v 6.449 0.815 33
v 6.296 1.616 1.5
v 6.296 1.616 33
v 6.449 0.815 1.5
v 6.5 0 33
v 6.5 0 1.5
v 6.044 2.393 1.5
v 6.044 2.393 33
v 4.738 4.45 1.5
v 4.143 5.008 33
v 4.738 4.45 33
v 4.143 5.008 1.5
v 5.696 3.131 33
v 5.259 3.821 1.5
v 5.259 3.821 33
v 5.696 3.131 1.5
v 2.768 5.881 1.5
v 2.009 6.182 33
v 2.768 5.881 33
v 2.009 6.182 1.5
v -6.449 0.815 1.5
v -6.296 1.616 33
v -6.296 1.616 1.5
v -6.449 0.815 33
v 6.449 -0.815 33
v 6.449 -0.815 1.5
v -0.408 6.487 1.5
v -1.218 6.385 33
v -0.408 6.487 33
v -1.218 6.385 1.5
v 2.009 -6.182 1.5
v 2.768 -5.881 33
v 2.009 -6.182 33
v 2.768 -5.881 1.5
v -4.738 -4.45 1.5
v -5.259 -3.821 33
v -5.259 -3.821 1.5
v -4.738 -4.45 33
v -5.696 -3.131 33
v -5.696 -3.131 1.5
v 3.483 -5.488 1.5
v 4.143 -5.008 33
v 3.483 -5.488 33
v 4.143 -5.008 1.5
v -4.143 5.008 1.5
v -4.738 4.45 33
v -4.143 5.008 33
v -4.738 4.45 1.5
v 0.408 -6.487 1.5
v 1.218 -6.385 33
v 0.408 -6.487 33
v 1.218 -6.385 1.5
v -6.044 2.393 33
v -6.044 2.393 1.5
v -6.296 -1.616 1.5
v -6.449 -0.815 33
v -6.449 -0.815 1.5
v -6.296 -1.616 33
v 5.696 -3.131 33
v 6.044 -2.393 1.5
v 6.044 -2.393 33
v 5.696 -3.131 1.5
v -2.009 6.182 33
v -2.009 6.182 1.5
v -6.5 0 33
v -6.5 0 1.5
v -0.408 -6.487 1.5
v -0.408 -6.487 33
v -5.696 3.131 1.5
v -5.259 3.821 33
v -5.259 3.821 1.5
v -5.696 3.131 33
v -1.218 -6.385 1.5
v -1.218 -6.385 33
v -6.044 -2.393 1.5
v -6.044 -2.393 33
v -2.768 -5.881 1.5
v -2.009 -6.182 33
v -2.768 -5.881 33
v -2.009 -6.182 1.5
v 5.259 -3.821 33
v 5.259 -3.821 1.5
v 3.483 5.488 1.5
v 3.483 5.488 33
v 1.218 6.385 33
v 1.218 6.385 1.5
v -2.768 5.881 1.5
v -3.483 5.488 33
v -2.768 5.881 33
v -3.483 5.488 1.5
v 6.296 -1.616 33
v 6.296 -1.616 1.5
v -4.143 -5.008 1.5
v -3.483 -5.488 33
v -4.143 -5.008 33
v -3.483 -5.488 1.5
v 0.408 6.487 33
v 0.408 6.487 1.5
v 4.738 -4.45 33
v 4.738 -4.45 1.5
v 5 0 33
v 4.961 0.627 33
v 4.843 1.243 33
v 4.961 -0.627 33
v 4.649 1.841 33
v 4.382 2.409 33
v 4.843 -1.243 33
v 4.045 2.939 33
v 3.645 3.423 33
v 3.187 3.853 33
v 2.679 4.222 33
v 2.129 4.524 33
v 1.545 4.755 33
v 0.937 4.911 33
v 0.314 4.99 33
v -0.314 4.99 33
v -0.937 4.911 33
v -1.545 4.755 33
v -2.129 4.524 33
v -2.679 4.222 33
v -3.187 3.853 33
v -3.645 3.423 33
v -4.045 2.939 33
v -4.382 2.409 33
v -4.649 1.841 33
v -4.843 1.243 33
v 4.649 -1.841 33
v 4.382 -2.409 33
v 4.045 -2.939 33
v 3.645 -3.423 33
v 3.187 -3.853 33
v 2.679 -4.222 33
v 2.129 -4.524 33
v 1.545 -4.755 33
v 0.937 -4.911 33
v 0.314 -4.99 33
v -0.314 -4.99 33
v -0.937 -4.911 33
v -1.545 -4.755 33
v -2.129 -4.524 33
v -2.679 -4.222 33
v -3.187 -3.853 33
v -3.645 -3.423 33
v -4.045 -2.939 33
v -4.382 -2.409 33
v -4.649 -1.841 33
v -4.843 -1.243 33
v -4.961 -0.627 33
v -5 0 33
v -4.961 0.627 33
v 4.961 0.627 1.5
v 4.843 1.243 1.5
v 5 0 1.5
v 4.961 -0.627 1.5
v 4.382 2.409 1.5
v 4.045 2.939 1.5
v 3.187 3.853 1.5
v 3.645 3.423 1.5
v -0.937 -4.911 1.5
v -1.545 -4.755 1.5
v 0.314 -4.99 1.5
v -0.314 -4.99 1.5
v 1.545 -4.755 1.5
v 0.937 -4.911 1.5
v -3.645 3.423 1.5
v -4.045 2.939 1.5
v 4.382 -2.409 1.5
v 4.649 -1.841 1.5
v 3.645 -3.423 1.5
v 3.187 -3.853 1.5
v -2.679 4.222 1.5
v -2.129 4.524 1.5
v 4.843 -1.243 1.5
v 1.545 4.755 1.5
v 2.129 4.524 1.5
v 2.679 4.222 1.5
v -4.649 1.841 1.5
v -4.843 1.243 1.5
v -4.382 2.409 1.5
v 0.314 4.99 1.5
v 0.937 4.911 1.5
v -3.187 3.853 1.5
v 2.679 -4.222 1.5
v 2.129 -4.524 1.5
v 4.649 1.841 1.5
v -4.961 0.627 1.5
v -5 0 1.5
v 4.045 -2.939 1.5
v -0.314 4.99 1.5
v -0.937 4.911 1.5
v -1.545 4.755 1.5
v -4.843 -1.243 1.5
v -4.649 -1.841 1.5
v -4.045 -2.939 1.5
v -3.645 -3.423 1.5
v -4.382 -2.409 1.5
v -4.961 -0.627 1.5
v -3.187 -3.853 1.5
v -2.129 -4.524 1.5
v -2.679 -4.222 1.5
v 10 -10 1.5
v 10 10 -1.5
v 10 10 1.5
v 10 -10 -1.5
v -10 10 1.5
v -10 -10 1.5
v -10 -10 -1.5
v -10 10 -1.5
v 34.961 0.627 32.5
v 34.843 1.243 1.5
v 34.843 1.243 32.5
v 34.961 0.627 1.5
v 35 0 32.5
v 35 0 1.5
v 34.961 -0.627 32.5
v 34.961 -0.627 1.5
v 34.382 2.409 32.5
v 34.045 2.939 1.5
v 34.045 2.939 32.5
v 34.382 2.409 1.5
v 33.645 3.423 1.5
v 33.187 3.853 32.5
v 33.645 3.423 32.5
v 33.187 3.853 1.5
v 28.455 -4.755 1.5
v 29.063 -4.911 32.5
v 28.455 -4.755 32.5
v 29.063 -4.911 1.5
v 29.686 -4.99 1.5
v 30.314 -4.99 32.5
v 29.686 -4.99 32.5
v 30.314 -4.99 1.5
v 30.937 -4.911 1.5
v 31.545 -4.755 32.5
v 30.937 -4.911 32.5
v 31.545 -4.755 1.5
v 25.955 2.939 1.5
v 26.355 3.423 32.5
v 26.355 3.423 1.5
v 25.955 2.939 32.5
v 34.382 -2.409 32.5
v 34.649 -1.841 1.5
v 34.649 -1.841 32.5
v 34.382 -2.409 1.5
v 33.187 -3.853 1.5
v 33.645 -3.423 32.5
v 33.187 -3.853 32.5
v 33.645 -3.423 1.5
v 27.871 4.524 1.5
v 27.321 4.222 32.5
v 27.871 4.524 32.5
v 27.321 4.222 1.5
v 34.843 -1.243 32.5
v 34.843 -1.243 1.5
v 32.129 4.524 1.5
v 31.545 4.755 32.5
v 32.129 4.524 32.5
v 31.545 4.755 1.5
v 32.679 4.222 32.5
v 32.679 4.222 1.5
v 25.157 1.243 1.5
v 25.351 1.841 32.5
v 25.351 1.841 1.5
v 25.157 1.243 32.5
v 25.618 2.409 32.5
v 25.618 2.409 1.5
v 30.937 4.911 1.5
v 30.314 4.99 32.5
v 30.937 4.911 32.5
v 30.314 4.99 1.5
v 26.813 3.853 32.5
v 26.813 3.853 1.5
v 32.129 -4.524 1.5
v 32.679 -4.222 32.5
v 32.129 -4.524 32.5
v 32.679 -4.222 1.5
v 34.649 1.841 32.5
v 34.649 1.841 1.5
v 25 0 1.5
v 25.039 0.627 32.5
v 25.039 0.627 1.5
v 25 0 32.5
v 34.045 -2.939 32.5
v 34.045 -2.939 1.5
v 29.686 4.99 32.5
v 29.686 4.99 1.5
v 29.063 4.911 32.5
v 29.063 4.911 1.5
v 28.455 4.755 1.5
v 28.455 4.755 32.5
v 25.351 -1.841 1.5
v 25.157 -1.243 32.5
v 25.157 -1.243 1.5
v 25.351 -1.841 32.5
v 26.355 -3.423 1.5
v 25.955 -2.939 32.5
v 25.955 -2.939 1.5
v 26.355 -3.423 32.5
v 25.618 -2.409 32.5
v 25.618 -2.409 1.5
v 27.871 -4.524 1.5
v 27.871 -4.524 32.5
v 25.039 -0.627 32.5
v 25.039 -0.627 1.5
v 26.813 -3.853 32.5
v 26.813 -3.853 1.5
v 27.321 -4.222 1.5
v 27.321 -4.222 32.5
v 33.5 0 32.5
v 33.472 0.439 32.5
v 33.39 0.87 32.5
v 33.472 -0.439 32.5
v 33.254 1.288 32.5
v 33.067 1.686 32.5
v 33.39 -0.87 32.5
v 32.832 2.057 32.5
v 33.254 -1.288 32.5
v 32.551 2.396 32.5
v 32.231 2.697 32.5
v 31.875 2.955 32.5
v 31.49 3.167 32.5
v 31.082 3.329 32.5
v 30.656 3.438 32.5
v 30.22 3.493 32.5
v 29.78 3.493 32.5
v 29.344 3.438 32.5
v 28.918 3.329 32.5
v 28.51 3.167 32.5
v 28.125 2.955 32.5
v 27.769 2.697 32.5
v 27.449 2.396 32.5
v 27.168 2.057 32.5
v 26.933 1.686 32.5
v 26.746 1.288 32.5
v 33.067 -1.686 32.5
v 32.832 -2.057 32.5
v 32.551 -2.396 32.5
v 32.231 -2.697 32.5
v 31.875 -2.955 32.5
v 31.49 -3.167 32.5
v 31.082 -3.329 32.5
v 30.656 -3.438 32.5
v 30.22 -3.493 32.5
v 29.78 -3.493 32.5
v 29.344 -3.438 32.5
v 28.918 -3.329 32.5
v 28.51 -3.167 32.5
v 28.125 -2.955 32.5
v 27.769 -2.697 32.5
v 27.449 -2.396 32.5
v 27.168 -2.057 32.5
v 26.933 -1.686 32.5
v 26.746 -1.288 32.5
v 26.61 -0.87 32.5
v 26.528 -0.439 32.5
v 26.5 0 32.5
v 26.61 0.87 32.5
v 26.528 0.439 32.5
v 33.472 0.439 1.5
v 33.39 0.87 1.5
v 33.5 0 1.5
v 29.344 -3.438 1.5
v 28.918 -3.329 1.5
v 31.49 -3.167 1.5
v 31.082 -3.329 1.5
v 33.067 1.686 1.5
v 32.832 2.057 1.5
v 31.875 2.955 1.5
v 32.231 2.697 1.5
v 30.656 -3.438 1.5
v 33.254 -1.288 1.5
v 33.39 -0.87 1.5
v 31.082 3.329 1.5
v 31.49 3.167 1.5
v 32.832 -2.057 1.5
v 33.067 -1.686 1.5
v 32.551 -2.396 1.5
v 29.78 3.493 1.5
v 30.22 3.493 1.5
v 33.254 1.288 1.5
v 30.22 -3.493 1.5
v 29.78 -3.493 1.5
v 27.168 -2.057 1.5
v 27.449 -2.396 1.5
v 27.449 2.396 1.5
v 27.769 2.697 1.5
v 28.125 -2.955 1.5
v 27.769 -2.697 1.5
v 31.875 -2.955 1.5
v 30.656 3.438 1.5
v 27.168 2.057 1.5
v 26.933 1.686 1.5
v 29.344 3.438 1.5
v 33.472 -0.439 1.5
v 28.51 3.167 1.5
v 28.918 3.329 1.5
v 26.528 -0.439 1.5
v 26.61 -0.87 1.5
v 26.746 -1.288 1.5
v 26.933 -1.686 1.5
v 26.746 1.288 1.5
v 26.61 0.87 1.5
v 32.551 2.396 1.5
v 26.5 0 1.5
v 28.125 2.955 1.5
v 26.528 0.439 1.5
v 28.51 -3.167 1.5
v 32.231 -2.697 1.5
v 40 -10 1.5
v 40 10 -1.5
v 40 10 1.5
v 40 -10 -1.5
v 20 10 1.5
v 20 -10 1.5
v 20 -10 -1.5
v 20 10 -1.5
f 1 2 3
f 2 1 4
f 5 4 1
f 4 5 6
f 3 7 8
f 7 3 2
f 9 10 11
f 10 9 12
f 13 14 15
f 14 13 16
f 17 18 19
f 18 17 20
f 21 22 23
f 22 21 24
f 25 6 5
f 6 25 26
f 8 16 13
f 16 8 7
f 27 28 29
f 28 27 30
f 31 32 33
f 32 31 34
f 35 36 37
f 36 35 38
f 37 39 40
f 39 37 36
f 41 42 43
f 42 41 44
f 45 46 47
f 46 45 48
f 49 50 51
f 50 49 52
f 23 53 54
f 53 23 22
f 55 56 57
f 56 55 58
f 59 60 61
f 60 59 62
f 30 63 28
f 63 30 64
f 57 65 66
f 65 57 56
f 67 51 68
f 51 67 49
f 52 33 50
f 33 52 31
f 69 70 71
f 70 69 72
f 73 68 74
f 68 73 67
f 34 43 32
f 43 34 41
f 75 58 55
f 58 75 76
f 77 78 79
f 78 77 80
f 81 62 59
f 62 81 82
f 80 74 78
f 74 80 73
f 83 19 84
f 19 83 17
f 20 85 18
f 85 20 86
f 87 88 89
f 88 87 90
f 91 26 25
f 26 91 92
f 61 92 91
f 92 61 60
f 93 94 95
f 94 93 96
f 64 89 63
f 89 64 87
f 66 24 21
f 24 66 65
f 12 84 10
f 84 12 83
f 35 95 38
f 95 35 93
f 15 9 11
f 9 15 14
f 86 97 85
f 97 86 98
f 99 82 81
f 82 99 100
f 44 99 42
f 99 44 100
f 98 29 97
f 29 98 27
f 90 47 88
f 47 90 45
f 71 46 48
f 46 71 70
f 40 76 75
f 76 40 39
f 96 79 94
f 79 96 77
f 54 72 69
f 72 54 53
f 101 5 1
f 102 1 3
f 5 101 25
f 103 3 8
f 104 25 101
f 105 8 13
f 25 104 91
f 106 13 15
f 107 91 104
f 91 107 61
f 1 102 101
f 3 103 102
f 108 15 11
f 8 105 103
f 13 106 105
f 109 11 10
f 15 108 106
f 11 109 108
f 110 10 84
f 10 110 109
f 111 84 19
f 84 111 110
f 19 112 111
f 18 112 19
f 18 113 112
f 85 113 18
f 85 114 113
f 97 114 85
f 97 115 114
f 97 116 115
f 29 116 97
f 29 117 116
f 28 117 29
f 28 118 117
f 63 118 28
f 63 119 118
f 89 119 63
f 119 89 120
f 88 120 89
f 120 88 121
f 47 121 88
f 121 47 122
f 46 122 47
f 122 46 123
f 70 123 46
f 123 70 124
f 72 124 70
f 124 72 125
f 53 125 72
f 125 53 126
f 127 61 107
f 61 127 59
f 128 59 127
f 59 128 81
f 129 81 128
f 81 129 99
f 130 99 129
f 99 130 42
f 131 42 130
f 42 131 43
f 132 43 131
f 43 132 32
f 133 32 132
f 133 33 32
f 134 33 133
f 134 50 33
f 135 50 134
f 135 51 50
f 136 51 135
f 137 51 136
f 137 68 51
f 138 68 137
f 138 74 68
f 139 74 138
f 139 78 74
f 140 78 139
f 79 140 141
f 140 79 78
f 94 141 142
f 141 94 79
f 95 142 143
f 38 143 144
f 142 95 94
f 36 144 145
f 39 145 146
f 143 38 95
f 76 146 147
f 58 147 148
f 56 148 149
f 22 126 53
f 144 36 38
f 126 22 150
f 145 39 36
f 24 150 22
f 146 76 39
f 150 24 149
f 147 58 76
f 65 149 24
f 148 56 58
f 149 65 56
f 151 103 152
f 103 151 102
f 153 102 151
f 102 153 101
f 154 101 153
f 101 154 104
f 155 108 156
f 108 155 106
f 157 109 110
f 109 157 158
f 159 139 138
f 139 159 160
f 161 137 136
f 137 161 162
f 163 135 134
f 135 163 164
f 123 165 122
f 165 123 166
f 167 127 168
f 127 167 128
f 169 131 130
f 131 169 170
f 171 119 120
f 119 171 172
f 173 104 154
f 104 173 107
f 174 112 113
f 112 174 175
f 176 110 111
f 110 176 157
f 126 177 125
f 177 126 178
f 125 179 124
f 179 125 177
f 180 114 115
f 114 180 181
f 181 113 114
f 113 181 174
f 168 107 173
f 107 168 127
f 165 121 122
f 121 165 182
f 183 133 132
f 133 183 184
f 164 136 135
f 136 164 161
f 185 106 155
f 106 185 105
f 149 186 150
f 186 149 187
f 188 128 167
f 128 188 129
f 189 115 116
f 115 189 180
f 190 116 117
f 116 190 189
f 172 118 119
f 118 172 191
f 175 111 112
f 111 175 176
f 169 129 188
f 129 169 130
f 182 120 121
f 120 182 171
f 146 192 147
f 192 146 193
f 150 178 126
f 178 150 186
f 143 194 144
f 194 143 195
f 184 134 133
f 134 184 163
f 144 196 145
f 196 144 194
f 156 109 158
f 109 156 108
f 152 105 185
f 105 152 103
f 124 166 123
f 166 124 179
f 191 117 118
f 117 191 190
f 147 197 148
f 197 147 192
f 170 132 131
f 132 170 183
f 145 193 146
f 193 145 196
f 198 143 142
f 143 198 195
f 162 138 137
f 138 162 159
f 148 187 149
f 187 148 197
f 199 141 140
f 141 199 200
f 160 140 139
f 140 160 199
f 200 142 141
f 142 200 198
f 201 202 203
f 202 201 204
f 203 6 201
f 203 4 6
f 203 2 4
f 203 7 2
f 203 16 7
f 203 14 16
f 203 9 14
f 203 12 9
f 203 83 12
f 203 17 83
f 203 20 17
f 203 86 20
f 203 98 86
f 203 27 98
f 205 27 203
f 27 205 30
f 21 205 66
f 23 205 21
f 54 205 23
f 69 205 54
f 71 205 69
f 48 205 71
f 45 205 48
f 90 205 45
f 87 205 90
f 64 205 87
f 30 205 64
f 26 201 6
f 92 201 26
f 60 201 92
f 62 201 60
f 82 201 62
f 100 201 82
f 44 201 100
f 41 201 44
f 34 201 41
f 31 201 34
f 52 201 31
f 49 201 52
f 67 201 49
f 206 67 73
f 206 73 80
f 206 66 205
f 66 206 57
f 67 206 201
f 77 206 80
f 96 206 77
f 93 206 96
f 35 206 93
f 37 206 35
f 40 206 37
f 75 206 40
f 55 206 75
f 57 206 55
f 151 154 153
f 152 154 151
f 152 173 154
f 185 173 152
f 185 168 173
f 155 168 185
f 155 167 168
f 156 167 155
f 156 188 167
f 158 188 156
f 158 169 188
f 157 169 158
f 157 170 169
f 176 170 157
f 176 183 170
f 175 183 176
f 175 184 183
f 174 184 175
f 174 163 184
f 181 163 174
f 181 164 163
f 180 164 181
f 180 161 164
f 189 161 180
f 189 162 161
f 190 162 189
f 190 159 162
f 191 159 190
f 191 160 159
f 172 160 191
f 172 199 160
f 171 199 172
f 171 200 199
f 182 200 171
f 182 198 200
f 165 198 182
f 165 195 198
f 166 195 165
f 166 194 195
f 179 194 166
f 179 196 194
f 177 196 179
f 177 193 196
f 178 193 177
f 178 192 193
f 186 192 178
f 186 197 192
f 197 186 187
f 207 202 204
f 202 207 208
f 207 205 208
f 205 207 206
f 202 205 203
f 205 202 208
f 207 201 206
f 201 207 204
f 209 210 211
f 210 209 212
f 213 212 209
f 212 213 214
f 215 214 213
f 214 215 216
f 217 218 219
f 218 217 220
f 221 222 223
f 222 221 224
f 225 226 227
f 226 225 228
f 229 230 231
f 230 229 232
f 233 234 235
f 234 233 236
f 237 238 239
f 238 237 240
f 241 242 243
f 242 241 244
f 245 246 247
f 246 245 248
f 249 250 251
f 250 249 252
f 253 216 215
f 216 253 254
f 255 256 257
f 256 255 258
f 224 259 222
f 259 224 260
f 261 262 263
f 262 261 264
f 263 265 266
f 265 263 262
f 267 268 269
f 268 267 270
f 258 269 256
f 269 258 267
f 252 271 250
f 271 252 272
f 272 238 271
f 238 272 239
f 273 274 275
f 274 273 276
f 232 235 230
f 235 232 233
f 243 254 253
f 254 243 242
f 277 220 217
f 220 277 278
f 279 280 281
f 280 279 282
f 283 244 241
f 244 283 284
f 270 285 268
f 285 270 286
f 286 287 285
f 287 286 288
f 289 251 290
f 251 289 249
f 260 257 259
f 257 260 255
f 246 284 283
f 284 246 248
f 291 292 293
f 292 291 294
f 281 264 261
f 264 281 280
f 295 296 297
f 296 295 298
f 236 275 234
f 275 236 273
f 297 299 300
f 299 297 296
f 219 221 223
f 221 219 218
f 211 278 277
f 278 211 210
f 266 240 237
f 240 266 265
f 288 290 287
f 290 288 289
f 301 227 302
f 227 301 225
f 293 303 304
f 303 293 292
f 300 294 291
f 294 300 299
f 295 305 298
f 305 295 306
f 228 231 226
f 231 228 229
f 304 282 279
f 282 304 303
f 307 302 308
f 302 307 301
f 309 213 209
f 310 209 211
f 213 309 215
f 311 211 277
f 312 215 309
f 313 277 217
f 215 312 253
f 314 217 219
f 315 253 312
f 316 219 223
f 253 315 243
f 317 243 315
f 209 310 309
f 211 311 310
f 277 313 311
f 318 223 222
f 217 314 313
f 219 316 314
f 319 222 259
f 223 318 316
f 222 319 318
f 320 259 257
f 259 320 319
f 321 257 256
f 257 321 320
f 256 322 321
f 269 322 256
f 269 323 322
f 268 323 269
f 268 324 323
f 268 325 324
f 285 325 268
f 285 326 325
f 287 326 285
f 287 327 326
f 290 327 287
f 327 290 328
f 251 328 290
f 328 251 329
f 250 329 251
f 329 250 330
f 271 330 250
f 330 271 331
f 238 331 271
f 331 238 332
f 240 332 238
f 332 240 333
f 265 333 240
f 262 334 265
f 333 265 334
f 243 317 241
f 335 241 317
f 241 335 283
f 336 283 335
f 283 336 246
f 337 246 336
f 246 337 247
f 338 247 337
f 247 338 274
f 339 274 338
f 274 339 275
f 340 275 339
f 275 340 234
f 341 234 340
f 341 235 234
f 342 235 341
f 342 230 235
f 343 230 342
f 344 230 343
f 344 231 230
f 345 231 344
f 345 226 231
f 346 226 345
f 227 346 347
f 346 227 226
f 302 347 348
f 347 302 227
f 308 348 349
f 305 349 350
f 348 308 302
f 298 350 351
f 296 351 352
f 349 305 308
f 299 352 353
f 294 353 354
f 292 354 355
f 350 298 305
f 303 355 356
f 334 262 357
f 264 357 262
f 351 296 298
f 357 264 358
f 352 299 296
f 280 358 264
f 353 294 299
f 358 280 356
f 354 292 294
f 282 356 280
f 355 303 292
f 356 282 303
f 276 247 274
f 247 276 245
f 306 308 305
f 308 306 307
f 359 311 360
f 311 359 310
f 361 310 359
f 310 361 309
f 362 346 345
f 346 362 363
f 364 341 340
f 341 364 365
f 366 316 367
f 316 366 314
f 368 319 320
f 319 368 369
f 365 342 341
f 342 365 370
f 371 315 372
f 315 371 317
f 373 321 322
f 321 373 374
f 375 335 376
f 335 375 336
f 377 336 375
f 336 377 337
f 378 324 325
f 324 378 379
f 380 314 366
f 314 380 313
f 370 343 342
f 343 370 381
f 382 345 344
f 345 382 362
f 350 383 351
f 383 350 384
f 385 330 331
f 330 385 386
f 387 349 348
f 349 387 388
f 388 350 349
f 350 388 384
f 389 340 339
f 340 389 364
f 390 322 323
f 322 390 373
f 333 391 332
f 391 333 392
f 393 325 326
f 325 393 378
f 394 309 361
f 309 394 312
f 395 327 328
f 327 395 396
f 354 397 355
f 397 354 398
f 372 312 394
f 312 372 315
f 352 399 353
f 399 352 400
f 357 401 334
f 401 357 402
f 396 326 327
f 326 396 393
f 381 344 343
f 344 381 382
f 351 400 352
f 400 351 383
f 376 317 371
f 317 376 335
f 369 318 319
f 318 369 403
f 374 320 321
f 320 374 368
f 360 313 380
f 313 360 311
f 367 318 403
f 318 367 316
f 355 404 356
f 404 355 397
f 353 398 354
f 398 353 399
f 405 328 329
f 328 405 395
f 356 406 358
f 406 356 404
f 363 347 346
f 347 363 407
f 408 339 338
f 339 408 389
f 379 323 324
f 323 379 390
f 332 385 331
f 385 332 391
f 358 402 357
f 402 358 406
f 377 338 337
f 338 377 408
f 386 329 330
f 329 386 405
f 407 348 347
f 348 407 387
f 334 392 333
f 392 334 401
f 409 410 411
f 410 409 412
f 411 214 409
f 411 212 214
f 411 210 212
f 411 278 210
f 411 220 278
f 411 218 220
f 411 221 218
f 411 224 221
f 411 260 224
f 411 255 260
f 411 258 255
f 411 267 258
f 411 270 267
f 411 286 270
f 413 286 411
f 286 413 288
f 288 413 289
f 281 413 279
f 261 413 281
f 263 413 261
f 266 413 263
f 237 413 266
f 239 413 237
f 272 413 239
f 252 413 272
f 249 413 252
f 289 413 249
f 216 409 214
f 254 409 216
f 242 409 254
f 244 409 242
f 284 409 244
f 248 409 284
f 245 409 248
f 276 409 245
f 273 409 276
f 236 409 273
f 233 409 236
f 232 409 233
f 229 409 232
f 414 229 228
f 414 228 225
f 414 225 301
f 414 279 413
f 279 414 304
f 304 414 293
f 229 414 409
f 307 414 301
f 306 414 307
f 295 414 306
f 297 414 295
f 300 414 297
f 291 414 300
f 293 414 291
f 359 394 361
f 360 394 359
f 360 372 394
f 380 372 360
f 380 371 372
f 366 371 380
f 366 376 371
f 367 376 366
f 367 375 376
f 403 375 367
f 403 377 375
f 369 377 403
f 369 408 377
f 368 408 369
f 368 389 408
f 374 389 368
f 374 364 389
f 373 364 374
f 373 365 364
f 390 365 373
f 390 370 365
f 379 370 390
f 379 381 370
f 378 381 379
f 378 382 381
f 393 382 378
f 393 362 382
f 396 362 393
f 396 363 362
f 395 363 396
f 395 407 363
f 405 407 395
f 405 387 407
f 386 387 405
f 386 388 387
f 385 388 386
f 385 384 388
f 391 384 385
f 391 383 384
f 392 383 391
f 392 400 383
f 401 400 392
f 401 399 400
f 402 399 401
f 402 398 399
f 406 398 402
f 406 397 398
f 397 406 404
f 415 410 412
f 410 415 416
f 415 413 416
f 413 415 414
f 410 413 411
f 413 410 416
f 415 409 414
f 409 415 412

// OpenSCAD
/** *** ***** ******* ***********
//
// Generic Ring Object Storage/Dispenser - Ringhalter
// 
// Version 2 - 11.09.2017 : Customizer
// CC-BY-NC-SA October 2017 by ohuf@Thingiverse
//
// www.thingiverse.com/thing:2741363


(English text: scroll down...)

Ein generischer, zweiteiliger Halter / Spender für Ringe und "ringartige Objekte": Dichtungen, Muttern, Marierungsringe....
Die Ringe werden auf einen Dorn aufgezogen. zwei Platten oben und unten verhindern ein Herausrutschen der Ringe.

Der Clou an der Sache ist, dass durch die Konstruktionsweise das Entnehmen eines beliebigen Ringes in der "Kette" möglich ist, ohne alle oberen Ringe herunternehmen zu müssen!

Wenn du einen hergestellt hast, lass es mich über "I Made One" wissen!

Konstruiert in OpenSCAD: viel Spaß beim Remixen!


-- --- ----- ------- -----------

This is a simple 2-part Holder/Storage/Dispenser for rings and "ring-like objects".
The rings are being put over a central pin. The special thing about this Holder is the dispenser-function: You can take out any one of the rings in the "chain" without first removing the rings above it: just pull the base plates, separate the ring(s) you need, separate the two pins and remove the rings you want.

See the photos for how to use it...

You can use the customizer to create your own Ring Dispenser...


Enjoy, have fun remixing and let me know when you've made one, and what for!

// 
// License: CC-BY-NC-SA 11.09.2017 oli@huf.org
// read all about it here: http://creativecommons.org/licenses/by-nc-sa/4.0/
//
** *** ***** ******* ***********/





/* [Size] */

// The outer diameter of the pin. This must be equal to or smaller than the inner diameter of your rings.
d_outer = 13;

// - The overall height. This defines how many objects you can store
height = 33;

// - Correctional factor for inner tube: if your printer is *very exact* then leave this at "0". However, if the two parts have a fit too tight to slide, you can increase this by small steps (e.g.: 0.2mm). Increase means higher gap!
corr = 0;

// The outer diameter of your objects. This defines the size of the base plate.
base_plate_size = 20;	

//  - You can select which part you want to design (Default: Both!)
create=1; // [1:Both Parts, 0:Inner Only, 2:Outer Only]


/* [Hidden] */

// roundness:
$fn=50;

// the wall thickness
d_wall = 3;


// hidden
d_inner = d_outer-d_wall-corr;


if(create>0){
	// outer part:
	union(){
		difference(){
			cylinder(d=d_outer, h=height);
			cylinder(d=d_outer-d_wall+corr/2, h=height+0.005);
		}
		cube([base_plate_size, base_plate_size, d_wall], center=true);
	}
}

if(create<2){
	// inner part:
	translate([base_plate_size+10, 0, 0])
	union(){
		difference(){
			cylinder(d=d_outer-d_wall-corr/2, h=height-0.5);
			cylinder(d=d_outer-2*d_wall, h=height-0.5+0.005);
		}
		cube([base_plate_size, base_plate_size, d_wall], center=true);
	}
}
